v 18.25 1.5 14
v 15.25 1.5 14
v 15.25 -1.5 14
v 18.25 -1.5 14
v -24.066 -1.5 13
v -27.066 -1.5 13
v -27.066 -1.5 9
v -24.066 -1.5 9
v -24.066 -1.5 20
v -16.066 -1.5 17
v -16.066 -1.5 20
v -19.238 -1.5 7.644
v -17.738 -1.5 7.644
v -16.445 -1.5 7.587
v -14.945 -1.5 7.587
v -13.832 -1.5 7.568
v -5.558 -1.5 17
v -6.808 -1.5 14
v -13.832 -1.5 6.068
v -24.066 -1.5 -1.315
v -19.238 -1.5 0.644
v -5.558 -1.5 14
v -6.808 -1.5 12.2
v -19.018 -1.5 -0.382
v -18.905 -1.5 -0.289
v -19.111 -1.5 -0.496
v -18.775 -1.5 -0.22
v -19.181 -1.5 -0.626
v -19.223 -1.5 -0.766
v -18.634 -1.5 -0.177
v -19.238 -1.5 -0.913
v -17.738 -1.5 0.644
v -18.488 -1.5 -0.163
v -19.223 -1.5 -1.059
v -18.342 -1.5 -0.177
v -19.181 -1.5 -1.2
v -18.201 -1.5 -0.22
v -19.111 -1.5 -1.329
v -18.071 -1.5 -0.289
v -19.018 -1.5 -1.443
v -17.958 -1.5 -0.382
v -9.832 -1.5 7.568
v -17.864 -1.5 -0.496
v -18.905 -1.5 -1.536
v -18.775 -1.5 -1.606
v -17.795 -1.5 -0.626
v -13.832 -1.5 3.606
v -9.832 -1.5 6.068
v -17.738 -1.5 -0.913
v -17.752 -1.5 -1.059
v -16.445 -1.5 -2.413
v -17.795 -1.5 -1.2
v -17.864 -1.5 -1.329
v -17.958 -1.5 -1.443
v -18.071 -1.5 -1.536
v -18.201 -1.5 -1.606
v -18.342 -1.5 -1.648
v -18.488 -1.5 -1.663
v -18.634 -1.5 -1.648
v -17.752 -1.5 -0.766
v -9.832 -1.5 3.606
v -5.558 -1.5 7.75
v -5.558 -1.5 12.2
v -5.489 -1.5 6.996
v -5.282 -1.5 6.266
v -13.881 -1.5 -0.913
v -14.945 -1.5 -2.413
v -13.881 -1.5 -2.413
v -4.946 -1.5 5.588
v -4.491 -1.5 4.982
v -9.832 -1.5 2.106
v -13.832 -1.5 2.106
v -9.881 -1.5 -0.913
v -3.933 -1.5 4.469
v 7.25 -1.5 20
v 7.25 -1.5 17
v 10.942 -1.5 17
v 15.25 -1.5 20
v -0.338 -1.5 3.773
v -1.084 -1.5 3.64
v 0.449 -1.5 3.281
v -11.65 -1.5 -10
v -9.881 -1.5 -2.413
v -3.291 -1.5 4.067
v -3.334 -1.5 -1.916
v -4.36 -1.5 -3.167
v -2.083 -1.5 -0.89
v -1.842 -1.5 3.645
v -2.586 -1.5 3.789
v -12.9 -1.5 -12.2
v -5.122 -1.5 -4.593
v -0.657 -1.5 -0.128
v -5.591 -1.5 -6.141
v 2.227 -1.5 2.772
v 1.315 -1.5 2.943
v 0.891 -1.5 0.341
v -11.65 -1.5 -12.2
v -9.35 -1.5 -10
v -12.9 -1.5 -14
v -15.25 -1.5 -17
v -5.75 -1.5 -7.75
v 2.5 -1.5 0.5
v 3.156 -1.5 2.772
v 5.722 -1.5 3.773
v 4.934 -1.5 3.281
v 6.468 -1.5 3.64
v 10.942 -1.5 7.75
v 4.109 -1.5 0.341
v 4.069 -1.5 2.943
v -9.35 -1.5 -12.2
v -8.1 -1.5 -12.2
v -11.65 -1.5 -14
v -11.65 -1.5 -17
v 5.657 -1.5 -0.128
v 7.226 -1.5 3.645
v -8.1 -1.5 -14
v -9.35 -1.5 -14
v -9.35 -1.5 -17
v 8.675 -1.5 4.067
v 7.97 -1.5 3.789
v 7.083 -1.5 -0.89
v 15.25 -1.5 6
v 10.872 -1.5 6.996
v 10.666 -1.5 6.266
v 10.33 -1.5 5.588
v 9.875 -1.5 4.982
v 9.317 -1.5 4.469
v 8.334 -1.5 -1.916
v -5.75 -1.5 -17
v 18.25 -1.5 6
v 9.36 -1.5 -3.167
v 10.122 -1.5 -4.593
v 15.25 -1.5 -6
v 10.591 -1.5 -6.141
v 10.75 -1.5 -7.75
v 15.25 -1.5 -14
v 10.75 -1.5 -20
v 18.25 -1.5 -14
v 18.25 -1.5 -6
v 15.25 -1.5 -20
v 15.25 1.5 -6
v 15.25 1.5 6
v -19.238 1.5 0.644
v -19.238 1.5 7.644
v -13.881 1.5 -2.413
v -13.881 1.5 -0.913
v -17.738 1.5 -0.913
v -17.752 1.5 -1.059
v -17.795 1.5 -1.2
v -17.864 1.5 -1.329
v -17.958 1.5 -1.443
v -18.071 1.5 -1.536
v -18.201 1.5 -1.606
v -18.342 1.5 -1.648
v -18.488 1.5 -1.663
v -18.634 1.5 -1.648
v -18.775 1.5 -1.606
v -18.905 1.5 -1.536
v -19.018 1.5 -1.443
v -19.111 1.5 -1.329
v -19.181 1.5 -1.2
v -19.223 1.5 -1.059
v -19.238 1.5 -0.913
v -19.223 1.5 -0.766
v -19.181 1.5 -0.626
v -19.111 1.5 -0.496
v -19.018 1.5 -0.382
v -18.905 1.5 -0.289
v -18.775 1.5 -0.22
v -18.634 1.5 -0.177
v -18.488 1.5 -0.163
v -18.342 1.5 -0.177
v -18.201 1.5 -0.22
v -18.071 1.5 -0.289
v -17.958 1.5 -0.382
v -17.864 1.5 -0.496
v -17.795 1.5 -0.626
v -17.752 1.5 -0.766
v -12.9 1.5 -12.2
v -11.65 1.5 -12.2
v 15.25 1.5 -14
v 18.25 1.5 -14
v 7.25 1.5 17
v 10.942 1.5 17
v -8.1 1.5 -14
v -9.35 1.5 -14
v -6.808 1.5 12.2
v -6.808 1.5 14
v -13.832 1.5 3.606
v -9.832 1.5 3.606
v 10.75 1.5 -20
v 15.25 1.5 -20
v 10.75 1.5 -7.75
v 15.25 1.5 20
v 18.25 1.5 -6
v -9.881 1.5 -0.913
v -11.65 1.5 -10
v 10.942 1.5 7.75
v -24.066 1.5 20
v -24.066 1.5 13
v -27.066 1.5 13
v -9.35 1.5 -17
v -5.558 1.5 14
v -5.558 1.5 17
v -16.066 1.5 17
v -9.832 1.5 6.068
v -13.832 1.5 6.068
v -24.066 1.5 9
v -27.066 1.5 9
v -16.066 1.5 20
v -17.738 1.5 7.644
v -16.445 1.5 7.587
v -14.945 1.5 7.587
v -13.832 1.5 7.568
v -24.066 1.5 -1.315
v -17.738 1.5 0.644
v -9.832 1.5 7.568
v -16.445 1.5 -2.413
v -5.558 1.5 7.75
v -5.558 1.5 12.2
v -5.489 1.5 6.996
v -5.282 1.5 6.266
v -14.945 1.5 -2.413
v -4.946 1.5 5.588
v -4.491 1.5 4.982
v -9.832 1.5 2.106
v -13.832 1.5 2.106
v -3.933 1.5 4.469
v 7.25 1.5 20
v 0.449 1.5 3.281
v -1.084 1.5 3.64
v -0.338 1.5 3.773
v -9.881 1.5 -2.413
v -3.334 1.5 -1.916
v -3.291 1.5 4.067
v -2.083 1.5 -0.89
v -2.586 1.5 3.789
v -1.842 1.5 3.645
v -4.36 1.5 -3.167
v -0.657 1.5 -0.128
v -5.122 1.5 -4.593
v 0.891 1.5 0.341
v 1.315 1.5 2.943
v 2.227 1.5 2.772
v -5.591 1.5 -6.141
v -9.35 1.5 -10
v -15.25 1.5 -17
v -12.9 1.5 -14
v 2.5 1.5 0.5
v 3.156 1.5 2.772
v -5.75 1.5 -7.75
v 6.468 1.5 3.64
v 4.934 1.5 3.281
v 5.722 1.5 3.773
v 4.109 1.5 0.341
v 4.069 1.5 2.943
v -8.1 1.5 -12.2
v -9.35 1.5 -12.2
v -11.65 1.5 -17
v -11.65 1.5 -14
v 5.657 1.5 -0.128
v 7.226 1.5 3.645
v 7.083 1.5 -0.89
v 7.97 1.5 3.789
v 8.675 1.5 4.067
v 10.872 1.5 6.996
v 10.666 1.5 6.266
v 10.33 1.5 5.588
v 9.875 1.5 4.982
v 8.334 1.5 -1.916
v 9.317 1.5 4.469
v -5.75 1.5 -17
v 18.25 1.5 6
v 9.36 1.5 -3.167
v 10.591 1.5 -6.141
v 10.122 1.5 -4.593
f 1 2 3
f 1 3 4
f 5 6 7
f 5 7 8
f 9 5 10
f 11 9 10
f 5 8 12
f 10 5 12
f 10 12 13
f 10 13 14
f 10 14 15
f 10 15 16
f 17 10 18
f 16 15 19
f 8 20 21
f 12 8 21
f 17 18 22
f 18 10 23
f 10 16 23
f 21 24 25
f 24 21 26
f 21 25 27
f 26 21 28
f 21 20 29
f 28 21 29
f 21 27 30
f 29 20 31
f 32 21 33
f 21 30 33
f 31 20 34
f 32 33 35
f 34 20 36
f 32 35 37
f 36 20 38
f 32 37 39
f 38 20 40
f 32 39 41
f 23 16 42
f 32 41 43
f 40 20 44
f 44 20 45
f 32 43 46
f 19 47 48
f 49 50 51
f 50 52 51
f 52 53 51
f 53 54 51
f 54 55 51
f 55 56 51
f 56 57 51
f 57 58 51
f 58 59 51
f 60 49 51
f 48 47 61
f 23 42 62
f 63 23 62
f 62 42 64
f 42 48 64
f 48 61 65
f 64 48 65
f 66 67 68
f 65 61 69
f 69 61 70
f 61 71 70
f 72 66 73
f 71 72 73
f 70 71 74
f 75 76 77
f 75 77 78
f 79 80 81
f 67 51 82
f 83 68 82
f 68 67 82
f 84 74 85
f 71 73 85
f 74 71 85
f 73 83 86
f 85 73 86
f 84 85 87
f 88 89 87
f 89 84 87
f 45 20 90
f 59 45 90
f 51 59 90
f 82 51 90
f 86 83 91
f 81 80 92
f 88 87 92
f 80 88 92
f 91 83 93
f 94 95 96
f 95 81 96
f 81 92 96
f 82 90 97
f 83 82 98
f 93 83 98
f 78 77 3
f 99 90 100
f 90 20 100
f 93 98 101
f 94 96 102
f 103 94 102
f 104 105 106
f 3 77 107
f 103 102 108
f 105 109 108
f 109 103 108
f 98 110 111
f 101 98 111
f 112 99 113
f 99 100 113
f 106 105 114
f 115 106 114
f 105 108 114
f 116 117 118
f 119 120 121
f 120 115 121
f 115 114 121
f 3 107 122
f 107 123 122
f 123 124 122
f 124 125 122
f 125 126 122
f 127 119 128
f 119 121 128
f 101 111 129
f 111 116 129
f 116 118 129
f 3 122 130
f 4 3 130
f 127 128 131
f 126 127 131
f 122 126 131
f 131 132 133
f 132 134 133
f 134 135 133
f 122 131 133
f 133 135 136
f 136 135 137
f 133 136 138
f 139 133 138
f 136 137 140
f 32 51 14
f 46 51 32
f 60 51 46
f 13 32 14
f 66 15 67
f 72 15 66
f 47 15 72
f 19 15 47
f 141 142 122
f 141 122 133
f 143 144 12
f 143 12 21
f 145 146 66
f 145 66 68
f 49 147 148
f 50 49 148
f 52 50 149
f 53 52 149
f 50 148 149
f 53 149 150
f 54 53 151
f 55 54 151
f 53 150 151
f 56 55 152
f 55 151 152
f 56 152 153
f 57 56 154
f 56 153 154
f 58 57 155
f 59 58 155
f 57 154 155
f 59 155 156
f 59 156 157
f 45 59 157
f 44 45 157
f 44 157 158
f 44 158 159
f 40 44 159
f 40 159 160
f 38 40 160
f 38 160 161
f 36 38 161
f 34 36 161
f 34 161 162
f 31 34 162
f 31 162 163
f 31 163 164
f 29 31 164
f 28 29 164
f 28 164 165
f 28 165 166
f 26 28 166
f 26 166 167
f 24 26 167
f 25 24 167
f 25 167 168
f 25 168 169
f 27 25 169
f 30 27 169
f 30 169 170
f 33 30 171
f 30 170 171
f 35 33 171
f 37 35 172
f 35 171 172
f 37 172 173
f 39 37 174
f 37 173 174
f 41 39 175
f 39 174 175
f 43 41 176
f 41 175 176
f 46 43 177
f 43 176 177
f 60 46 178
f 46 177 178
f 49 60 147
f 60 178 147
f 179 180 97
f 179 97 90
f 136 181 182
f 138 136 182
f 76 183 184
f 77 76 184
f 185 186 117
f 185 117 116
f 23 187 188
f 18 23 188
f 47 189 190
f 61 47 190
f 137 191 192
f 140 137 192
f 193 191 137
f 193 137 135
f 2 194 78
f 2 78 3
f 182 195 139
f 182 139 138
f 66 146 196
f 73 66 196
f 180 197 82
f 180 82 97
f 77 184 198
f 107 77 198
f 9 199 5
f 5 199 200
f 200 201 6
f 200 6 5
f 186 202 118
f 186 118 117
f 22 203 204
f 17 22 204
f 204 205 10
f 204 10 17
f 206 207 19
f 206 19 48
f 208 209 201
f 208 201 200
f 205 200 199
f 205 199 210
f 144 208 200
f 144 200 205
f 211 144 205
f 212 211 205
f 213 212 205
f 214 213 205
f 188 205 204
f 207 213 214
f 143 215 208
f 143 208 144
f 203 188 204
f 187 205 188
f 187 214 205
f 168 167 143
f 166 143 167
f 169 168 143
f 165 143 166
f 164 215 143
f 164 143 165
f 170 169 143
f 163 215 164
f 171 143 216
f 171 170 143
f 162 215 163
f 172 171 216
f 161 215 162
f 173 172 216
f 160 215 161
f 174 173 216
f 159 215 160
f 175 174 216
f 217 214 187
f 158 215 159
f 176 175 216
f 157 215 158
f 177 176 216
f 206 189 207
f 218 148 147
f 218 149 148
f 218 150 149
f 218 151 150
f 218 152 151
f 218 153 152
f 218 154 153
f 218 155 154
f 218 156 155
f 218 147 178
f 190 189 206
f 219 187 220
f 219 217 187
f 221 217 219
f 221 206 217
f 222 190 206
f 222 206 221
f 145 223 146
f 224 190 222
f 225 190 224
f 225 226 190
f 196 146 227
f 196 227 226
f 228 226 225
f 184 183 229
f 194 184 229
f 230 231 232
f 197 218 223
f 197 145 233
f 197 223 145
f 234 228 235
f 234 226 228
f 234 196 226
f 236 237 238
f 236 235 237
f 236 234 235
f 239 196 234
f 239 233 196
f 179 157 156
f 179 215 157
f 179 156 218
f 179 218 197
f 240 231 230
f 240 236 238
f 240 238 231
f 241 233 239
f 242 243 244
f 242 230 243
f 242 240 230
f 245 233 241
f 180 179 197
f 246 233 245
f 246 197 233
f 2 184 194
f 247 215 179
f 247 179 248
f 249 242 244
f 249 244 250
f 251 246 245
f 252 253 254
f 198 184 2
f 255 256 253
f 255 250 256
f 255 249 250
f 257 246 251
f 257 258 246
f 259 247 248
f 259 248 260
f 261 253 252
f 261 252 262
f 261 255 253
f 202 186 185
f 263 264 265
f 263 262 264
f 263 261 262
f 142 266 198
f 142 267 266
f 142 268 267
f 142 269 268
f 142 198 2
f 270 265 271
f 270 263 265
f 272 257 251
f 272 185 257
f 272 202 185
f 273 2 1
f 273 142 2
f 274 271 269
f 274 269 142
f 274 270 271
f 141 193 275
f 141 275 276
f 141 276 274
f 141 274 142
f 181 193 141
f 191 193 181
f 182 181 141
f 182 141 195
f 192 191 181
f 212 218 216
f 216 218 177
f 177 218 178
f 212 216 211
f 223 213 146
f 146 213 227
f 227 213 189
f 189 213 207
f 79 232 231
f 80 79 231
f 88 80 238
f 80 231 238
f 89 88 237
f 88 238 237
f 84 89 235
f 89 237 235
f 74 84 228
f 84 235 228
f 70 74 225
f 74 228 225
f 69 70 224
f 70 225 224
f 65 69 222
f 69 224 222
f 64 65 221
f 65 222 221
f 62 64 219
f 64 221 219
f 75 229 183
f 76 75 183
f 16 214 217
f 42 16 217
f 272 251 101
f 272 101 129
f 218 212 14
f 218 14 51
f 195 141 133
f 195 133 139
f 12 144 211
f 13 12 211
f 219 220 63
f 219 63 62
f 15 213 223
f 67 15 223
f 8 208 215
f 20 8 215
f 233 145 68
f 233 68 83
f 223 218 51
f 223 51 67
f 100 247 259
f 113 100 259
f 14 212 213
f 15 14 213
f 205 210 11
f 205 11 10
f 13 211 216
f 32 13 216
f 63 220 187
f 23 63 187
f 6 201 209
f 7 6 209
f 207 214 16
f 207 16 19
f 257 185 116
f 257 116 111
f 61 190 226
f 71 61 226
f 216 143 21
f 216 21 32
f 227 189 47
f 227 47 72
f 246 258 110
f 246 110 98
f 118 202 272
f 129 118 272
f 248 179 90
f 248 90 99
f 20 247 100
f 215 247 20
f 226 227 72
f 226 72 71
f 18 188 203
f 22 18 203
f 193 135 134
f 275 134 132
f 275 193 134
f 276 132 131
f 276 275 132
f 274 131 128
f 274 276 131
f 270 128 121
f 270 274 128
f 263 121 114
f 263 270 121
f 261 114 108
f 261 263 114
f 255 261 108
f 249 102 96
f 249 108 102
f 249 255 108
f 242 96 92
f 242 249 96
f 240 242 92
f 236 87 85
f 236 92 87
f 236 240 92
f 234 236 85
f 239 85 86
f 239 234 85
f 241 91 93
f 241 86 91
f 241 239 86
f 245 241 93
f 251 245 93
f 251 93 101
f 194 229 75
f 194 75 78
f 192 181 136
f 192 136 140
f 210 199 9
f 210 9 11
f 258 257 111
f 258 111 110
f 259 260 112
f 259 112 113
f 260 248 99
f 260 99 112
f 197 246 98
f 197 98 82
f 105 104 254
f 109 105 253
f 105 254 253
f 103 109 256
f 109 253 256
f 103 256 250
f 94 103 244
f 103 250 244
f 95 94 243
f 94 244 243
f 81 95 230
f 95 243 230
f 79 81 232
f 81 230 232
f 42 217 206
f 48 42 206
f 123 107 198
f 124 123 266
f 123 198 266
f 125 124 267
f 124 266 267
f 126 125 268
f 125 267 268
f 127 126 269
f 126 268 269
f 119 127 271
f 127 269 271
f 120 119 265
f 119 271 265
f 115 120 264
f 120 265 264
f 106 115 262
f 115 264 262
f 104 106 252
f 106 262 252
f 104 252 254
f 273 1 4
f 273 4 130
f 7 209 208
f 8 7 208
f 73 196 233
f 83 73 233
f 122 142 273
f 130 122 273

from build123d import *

# Parameters (mm, degrees)
SKETCH1_W           = 30.5
SKETCH1_H           = 34
BOSS_EXTRUDE1_DEPTH = 1.5
BOSS_EXTRUDE2_DEPTH = 3
SKETCH3_W           = 3
SKETCH3_H           = 8
SKETCH3_W_2         = 8
SKETCH3_H_2         = 3
BOSS_EXTRUDE3_DEPTH = 3
CUT_EXTRUDE1_DEPTH  = 4.0000001
CUT_EXTRUDE2_DEPTH  = 4.0000001
SKETCH6_W           = 8
SKETCH6_H           = 3
CUT_EXTRUDE3_DEPTH  = 4.0000001
CUT_EXTRUDE4_DEPTH  = 4.0000001
CUT_EXTRUDE6_DEPTH  = 4.0000001
SKETCH14_W          = 16.5
SKETCH14_H          = 9.25
CUT_EXTRUDE8_DEPTH  = 10
CUT_EXTRUDE10_DEPTH = 10
SKETCH18_R          = 5
CUT_EXTRUDE11_DEPTH = 10
SKETCH19_R          = 0.75
SKETCH19_W          = 4
SKETCH19_H          = 1.5
SKETCH19_W_2        = 1.5
SKETCH19_H_2        = 10
SKETCH19_H_3        = 7
CUT_EXTRUDE12_DEPTH = 10
SKETCH9_W           = 3
SKETCH9_H           = 4
BOSS_EXTRUDE4_DEPTH = 3


with BuildPart() as part:
    # Sketch1 → Boss-Extrude1 (new body, symmetric)
    with BuildSketch(Plane(origin=(0, 0, 0), x_dir=(1, 0, 0), z_dir=(0, 1, 0))):
        Rectangle(SKETCH1_W, SKETCH1_H)
    extrude(amount=BOSS_EXTRUDE1_DEPTH, both=True)

    # Sketch2 → Boss-Extrude2 (add)
    with BuildSketch(Plane(origin=(0, 1.5, 0), x_dir=(1, 0, 0), z_dir=(0, 1, 0))):
        with BuildLine():
            Line((-15.25, 17), (-24.07, 1.308996208))
            add(Edge.make_bspline(
                [(-24.07, 1.308996208), (-25.612124036, -1.43448158), (-30.226003395, -1.5229993), (-46.69780929, -11.088418218), (-55.382760657, -10.307171359), (-55.382760657, -17)],
                knots=[0, 0, 0, 0, 0.221130071, 0.603599568, 1, 1, 1, 1], degree=3))
            Line((-55.382760657, -17), (-15.25, -17))
            Line((-15.25, -17), (-15.25, 17))
        make_face()
    extrude(amount=-BOSS_EXTRUDE2_DEPTH)

    # Sketch3 → Boss-Extrude3 (add)
    with BuildSketch(Plane(origin=(0, 1.5, 0), x_dir=(1, 0, 0), z_dir=(0, 1, 0))):
        with Locations((16.75, 10)):
            Rectangle(SKETCH3_W, SKETCH3_H)
        with Locations((16.75, -10)):
            Rectangle(SKETCH3_W, SKETCH3_H)
        with Locations((-11.25, 18.5)):
            Rectangle(SKETCH3_W_2, SKETCH3_H_2)
        with Locations((11.25, 18.5)):
            Rectangle(SKETCH3_W_2, SKETCH3_H_2)
        with Locations((-51.382760657, -18.5)):
            Rectangle(SKETCH3_W_2, SKETCH3_H_2)
        with Locations((11.25, -18.5)):
            Rectangle(SKETCH3_W_2, SKETCH3_H_2)
        with Locations((-20.066380328, -18.5)):
            Rectangle(SKETCH3_W_2, SKETCH3_H_2)
    extrude(amount=-BOSS_EXTRUDE3_DEPTH)

    # Sketch4 → Cut-Extrude1 (cut, through all)
    with BuildSketch(Plane(origin=(0, 1.5, 0), x_dir=(1, 0, 0), z_dir=(0, 1, 0))):
        Polygon((-2.008190164, -14), (-2.008190164, -12.2), (-3.258190164, -12.2), (-3.258190164, -10), (-5.558190164, -10), (-5.558190164, -12.2), (-6.808190164, -12.2), (-6.808190164, -14), (-5.558190164, -14), (-5.558190164, -17), (-3.258190164, -17), (-3.258190164, -14), align=None)
        Polygon((-33.324570493, -14), (-33.324570493, -12.2), (-34.574570493, -12.2), (-34.574570493, -10), (-36.874570493, -10), (-36.874570493, -12.2), (-38.124570493, -12.2), (-38.124570493, -14), (-36.874570493, -14), (-36.874570493, -17), (-34.574570493, -17), (-34.574570493, -14), align=None)
    extrude(amount=-CUT_EXTRUDE1_DEPTH, mode=Mode.SUBTRACT)

    # Sketch5 → Cut-Extrude2 (cut, through all)
    with BuildSketch(Plane(origin=(0, 1.5, 0), x_dir=(1, 0, 0), z_dir=(0, 1, 0))):
        with BuildLine():
            Line((10.75, 20), (10.75, 7.75))
            ThreePointArc((10.75, 7.75), (2.5, -0.5), (-5.75, 7.75))
            Line((-5.75, 7.75), (-5.75, 20))
            Line((-5.75, 20), (10.75, 20))
        make_face()
    extrude(amount=-CUT_EXTRUDE2_DEPTH, mode=Mode.SUBTRACT)

    # Sketch6 → Cut-Extrude3 (cut, through all)
    with BuildSketch(Plane(origin=(0, 1.5, 0), x_dir=(1, 0, 0), z_dir=(0, 1, 0))):
        with Locations((-11.25, 18.5)):
            Rectangle(SKETCH6_W, SKETCH6_H)
    extrude(amount=-CUT_EXTRUDE3_DEPTH, mode=Mode.SUBTRACT)

    # Sketch7 → Cut-Extrude4 (cut, through all)
    with BuildSketch(Plane(origin=(0, 1.5, 0), x_dir=(1, 0, 0), z_dir=(0, 1, 0))):
        Polygon((-11.65, 17), (-9.35, 17), (-9.35, 14), (-8.1, 14), (-8.1, 12.2), (-9.35, 12.2), (-9.35, 10), (-11.65, 10), (-11.65, 12.2), (-12.9, 12.2), (-12.9, 14), (-11.65, 14), align=None)
    extrude(amount=-CUT_EXTRUDE4_DEPTH, mode=Mode.SUBTRACT)

    # Sketch8 → Cut-Extrude6 (cut, through all)
    with BuildSketch(Plane(origin=(0, 1.5, 0), x_dir=(1, 0, 0), z_dir=(0, 1, 0))):
        with BuildLine():
            Line((-24.066380328, -17), (-24.066380328, 1.315435696))
            Line((-24.066380328, 1.315435696), (-24.07, 1.308996208))
            add(Edge.make_bspline(
                [(-24.07, 1.308996208), (-25.612124036, -1.43448158), (-30.226003395, -1.5229993), (-46.69780929, -11.088418218), (-55.382760657, -10.307171359), (-55.382760657, -17)],
                knots=[0, 0, 0, 0, 0.221130071, 0.603599568, 1, 1, 1, 1], degree=3))
            Line((-55.382760657, -17), (-55.382760657, -20))
            Line((-55.382760657, -20), (-47.382760657, -20))
            Line((-47.382760657, -20), (-47.382760657, -17))
            Line((-47.382760657, -17), (-36.874570493, -17))
            Line((-36.874570493, -17), (-36.874570493, -14))
            Line((-36.874570493, -14), (-38.124570493, -14))
            Line((-38.124570493, -14), (-38.124570493, -12.2))
            Line((-38.124570493, -12.2), (-36.874570493, -12.2))
            Line((-36.874570493, -12.2), (-36.874570493, -10))
            Line((-36.874570493, -10), (-34.574570493, -10))
            Line((-34.574570493, -10), (-34.574570493, -12.2))
            Line((-34.574570493, -12.2), (-33.324570493, -12.2))
            Line((-33.324570493, -12.2), (-33.324570493, -14))
            Line((-33.324570493, -14), (-34.574570493, -14))
            Line((-34.574570493, -14), (-34.574570493, -17))
            Line((-34.574570493, -17), (-24.066380328, -17))
        make_face()
    extrude(amount=-CUT_EXTRUDE6_DEPTH, mode=Mode.SUBTRACT)

    # Sketch14 → Cut-Extrude8 (cut)
    with BuildSketch(Plane(origin=(0, 1.5, 0), x_dir=(1, 0, 0), z_dir=(0, 1, 0))):
        with Locations((2.691809836, -12.375)):
            Rectangle(SKETCH14_W, SKETCH14_H)
    extrude(amount=-CUT_EXTRUDE8_DEPTH, mode=Mode.SUBTRACT)

    # Sketch16 → Cut-Extrude10 (cut)
    with BuildSketch(Plane(origin=(0, 1.5, 0), x_dir=(1, 0, 0), z_dir=(0, 1, 0))):
        with BuildLine():
            Line((-5.558190164, -7.75), (2.691809836, -7.75))
            ThreePointArc((2.691809836, -7.75), (-1.433190164, -3.625), (-5.558190164, -7.75))
        make_face()
        with BuildLine():
            ThreePointArc((-5.558190164, -7.75), (-1.433190164, -11.875), (2.691809836, -7.75))
            Line((2.691809836, -7.75), (-5.558190164, -7.75))
        make_face()
        with BuildLine():
            Line((10.941809836, -7.75), (2.691809836, -7.75))
            ThreePointArc((2.691809836, -7.75), (6.816809836, -11.875), (10.941809836, -7.75))
        make_face()
        with BuildLine():
            ThreePointArc((10.941809836, -7.75), (6.816809836, -3.625), (2.691809836, -7.75))
            Line((2.691809836, -7.75), (10.941809836, -7.75))
        make_face()
    extrude(amount=-CUT_EXTRUDE10_DEPTH, mode=Mode.SUBTRACT)

    # Sketch18 → Cut-Extrude11 (cut)
    with BuildSketch(Plane(origin=(0, 1.5, 0), x_dir=(1, 0, 0), z_dir=(0, 1, 0))):
        with Locations((2.691809836, -7.75)):
            Circle(SKETCH18_R)
    extrude(amount=-CUT_EXTRUDE11_DEPTH, mode=Mode.SUBTRACT)

    # Sketch19 → Cut-Extrude12 (cut)
    with BuildSketch(Plane(origin=(0, 1.5, 0), x_dir=(1, 0, 0), z_dir=(0, 1, 0))):
        with Locations((-18.487833601, 0.912762829)):
            Circle(SKETCH19_R)
        with Locations((-11.831571961, -2.855782843)):
            Rectangle(SKETCH19_W, SKETCH19_H)
        with Locations((-15.694739931, -2.587237171)):
            Rectangle(SKETCH19_W_2, SKETCH19_H_2)
        with Locations((-11.881312648, 1.662762829)):
            Rectangle(SKETCH19_W, SKETCH19_H)
        with Locations((-11.831571961, -6.818375842)):
            Rectangle(SKETCH19_W, SKETCH19_H)
        with Locations((-18.487833601, -4.143833383)):
            Rectangle(SKETCH19_W_2, SKETCH19_H_3)
    extrude(amount=-CUT_EXTRUDE12_DEPTH, mode=Mode.SUBTRACT)

    # Sketch9 → Boss-Extrude4 (add)
    with BuildSketch(Plane(origin=(0, 1.5, 0), x_dir=(1, 0, 0), z_dir=(0, 1, 0))):
        with Locations((-25.566380328, -11)):
            Rectangle(SKETCH9_W, SKETCH9_H)
    extrude(amount=-BOSS_EXTRUDE4_DEPTH)


solid = part.part
